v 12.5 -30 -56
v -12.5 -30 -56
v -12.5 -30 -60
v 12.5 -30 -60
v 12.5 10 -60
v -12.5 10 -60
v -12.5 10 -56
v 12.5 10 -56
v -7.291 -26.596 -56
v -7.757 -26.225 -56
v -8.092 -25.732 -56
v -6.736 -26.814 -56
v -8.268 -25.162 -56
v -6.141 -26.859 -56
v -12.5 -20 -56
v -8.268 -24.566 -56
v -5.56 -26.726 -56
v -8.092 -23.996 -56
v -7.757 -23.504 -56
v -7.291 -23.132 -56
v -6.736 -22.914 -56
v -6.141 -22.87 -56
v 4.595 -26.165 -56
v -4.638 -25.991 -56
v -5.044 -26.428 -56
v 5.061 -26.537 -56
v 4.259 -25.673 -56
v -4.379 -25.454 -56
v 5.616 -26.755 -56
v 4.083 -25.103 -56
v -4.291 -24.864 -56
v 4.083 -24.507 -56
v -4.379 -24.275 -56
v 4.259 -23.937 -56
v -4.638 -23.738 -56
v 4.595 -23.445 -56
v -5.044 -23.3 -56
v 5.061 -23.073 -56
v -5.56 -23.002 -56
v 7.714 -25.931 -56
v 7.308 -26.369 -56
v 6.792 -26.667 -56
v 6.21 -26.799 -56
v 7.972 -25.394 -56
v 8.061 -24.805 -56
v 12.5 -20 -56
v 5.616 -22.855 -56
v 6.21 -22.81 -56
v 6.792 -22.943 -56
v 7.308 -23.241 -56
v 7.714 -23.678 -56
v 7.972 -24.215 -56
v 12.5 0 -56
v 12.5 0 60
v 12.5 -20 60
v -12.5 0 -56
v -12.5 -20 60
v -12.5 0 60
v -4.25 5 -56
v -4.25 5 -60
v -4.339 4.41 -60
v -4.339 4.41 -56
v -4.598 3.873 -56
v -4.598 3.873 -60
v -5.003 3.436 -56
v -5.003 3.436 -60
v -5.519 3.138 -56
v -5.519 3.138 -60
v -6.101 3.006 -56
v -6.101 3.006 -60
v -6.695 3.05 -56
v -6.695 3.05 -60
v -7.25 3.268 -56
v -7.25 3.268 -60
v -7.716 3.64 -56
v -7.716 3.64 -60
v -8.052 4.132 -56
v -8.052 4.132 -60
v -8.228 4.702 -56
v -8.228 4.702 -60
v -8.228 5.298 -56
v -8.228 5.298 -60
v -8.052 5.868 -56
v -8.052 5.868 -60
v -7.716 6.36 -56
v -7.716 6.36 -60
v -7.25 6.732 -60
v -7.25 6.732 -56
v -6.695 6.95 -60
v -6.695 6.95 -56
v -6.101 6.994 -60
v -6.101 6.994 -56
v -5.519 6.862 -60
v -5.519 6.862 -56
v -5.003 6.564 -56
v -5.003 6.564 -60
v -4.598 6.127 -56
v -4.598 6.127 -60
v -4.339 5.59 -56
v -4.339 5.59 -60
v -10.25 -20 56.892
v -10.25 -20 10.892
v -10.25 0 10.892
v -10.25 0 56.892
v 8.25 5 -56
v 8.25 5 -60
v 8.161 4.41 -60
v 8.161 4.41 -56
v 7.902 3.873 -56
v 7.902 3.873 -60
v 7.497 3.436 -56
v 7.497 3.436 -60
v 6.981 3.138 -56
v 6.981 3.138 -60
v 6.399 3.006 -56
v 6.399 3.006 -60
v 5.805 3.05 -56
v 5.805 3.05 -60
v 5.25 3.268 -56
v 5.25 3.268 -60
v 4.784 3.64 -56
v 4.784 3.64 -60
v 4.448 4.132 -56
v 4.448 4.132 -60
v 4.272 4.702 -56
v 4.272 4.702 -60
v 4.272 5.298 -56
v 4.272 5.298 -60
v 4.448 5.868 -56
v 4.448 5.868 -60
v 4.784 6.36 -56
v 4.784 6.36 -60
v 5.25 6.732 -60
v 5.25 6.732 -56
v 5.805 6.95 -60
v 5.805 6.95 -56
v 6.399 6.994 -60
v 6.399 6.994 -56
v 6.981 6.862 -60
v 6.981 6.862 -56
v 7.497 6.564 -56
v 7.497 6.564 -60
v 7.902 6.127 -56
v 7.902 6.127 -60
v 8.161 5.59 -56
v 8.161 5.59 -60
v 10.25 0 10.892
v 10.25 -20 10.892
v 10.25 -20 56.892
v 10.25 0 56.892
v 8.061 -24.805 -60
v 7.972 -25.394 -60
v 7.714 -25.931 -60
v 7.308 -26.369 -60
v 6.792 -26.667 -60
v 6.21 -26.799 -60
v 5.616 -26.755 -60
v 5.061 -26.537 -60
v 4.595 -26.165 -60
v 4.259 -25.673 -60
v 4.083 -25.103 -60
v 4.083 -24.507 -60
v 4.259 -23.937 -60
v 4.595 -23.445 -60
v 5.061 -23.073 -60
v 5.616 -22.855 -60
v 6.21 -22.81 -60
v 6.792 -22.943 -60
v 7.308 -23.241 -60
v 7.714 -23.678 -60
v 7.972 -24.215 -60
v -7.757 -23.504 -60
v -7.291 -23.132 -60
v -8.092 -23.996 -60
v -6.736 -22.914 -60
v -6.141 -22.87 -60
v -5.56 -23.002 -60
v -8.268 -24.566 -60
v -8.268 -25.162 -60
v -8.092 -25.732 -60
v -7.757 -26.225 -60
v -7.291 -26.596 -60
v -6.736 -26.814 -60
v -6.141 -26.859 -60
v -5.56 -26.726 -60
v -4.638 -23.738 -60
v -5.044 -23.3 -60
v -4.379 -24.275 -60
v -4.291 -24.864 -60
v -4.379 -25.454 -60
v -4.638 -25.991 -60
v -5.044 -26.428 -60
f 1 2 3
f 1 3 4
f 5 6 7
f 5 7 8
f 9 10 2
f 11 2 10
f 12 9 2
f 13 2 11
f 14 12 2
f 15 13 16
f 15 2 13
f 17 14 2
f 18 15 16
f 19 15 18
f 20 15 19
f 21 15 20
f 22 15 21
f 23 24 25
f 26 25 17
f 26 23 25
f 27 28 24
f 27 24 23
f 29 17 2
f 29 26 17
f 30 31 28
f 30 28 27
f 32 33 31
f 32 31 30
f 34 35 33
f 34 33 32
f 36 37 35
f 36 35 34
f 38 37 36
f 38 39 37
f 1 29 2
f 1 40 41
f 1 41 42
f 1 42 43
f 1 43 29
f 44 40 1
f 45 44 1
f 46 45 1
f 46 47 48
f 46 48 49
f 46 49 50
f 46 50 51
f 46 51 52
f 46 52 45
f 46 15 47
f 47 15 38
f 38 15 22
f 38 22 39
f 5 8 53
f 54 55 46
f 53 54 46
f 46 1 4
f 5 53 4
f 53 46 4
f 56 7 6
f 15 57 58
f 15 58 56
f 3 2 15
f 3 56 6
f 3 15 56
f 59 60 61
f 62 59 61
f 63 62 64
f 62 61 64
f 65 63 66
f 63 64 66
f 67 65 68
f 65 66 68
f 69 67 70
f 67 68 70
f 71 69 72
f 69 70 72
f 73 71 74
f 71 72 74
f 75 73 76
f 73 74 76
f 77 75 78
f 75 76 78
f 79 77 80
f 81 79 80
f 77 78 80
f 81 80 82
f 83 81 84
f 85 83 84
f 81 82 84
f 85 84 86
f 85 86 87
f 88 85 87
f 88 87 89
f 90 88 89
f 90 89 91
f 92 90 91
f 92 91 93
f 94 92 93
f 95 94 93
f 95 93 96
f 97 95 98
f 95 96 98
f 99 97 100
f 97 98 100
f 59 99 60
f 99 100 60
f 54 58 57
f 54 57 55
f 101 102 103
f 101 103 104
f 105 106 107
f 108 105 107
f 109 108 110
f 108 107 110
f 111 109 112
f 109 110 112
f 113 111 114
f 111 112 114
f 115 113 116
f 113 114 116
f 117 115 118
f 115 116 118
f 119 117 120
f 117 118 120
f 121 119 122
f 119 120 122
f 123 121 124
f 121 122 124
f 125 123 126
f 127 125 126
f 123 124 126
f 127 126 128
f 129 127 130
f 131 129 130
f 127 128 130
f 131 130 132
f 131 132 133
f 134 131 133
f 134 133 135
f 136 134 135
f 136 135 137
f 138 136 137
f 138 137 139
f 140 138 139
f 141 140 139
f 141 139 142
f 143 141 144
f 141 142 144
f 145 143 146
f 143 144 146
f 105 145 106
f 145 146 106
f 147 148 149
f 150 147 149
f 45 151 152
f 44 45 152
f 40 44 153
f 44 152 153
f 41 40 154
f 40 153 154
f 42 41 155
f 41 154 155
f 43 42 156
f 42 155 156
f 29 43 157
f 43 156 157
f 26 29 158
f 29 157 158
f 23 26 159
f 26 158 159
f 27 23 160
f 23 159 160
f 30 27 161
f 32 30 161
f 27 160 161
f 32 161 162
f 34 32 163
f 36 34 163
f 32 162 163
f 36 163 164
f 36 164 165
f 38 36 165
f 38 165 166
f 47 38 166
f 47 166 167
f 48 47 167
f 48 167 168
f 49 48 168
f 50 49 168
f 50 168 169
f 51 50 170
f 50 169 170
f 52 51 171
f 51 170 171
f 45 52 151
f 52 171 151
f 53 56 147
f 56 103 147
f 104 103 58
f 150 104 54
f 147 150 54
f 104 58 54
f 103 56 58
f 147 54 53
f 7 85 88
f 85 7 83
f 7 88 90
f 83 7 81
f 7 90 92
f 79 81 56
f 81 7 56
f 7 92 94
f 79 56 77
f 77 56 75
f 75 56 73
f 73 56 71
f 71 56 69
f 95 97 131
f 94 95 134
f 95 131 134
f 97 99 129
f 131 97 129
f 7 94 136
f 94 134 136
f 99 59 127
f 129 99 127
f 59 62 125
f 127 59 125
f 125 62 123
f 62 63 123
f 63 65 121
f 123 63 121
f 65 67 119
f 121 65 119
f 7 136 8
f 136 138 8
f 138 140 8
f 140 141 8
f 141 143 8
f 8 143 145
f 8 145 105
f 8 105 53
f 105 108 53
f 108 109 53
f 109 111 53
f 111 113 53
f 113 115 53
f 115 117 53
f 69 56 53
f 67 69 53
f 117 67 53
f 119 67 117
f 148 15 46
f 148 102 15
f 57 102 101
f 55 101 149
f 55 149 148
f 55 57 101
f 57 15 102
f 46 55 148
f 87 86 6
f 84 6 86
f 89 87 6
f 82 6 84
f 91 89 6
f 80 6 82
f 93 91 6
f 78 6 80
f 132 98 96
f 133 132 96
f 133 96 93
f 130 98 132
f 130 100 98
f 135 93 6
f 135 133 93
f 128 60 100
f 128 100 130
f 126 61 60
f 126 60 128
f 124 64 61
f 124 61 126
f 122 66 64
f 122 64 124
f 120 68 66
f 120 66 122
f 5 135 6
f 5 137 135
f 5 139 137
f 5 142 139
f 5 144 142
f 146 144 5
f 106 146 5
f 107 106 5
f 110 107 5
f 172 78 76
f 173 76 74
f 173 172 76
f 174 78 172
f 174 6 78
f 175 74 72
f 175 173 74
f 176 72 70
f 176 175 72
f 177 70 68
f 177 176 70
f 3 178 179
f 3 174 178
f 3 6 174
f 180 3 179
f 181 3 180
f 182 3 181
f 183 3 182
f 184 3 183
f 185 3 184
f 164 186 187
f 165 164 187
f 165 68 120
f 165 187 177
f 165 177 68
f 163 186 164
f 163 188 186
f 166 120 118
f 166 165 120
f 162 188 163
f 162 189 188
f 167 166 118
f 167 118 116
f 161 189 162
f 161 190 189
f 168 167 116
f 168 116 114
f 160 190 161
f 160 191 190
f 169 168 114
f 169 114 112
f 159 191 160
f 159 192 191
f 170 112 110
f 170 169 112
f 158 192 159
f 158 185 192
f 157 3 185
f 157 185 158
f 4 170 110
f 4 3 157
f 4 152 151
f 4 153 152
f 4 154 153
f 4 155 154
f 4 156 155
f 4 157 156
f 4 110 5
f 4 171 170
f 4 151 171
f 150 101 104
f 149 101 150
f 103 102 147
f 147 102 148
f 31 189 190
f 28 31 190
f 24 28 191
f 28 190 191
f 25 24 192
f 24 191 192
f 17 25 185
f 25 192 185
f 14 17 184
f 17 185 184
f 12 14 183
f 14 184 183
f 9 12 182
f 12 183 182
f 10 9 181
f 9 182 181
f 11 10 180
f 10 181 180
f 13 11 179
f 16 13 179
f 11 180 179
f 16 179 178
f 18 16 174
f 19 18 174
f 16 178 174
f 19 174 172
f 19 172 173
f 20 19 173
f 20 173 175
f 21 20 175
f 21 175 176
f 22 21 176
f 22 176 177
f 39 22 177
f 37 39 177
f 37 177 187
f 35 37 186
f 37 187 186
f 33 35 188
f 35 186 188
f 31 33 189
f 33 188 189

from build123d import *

# Parameters (mm, degrees)
SKETCH_W        = 25
SKETCH_H        = 120
PAD_DEPTH       = 20
SKETCH001_W     = 25
SKETCH001_H     = 4
PAD001_DEPTH    = 10
SKETCH002_R     = 2
POCKET_DEPTH    = 4
SKETCH003_W     = 25
SKETCH003_H     = 4
PAD002_DEPTH    = 10
SKETCH004_R     = 2
POCKET001_DEPTH = 4
SKETCH005_W     = 20.5
SKETCH005_H     = 46
POCKET002_DEPTH = 20


with BuildPart() as part:
    # Sketch → Pad (new body)
    with BuildSketch(Plane.XZ):
        Rectangle(SKETCH_W, SKETCH_H)
    extrude(amount=PAD_DEPTH)

    # Sketch001 → Pad001 (new body)
    with BuildSketch(Plane.XZ.offset(20)):
        with Locations((0, -58)):
            Rectangle(SKETCH001_W, SKETCH001_H)
    extrude(amount=PAD001_DEPTH)

    # Sketch002 → Pocket (cut)
    with BuildSketch(Plane(origin=(0, 0, -60), x_dir=(1, 0, 0), z_dir=(0, 0, -1))):
        with Locations((-6.290528, 24.864162)):
            Circle(SKETCH002_R)
        with Locations((6.061036, 24.804857)):
            Circle(SKETCH002_R)
    extrude(amount=-POCKET_DEPTH, mode=Mode.SUBTRACT)

    # Sketch003 → Pad002 (new body)
    with BuildSketch(Plane(origin=(0, 0, 0), x_dir=(1, 0, 0), z_dir=(0, 1, 0))):
        with Locations((0, 58)):
            Rectangle(SKETCH003_W, SKETCH003_H)
    extrude(amount=PAD002_DEPTH)

    # Sketch004 → Pocket001 (cut)
    with BuildSketch(Plane(origin=(0, 0, -60), x_dir=(1, 0, 0), z_dir=(0, 0, -1))):
        with Locations((-6.25, -5)):
            Circle(SKETCH004_R)
        with Locations((6.25, -5)):
            Circle(SKETCH004_R)
    extrude(amount=-POCKET001_DEPTH, mode=Mode.SUBTRACT)

    # Sketch005 → Pocket002 (cut)
    with BuildSketch(Plane.XZ.offset(20)):
        with Locations((0, 33.891745)):
            Rectangle(SKETCH005_W, SKETCH005_H)
    extrude(amount=-POCKET002_DEPTH, mode=Mode.SUBTRACT)


solid = part.part
